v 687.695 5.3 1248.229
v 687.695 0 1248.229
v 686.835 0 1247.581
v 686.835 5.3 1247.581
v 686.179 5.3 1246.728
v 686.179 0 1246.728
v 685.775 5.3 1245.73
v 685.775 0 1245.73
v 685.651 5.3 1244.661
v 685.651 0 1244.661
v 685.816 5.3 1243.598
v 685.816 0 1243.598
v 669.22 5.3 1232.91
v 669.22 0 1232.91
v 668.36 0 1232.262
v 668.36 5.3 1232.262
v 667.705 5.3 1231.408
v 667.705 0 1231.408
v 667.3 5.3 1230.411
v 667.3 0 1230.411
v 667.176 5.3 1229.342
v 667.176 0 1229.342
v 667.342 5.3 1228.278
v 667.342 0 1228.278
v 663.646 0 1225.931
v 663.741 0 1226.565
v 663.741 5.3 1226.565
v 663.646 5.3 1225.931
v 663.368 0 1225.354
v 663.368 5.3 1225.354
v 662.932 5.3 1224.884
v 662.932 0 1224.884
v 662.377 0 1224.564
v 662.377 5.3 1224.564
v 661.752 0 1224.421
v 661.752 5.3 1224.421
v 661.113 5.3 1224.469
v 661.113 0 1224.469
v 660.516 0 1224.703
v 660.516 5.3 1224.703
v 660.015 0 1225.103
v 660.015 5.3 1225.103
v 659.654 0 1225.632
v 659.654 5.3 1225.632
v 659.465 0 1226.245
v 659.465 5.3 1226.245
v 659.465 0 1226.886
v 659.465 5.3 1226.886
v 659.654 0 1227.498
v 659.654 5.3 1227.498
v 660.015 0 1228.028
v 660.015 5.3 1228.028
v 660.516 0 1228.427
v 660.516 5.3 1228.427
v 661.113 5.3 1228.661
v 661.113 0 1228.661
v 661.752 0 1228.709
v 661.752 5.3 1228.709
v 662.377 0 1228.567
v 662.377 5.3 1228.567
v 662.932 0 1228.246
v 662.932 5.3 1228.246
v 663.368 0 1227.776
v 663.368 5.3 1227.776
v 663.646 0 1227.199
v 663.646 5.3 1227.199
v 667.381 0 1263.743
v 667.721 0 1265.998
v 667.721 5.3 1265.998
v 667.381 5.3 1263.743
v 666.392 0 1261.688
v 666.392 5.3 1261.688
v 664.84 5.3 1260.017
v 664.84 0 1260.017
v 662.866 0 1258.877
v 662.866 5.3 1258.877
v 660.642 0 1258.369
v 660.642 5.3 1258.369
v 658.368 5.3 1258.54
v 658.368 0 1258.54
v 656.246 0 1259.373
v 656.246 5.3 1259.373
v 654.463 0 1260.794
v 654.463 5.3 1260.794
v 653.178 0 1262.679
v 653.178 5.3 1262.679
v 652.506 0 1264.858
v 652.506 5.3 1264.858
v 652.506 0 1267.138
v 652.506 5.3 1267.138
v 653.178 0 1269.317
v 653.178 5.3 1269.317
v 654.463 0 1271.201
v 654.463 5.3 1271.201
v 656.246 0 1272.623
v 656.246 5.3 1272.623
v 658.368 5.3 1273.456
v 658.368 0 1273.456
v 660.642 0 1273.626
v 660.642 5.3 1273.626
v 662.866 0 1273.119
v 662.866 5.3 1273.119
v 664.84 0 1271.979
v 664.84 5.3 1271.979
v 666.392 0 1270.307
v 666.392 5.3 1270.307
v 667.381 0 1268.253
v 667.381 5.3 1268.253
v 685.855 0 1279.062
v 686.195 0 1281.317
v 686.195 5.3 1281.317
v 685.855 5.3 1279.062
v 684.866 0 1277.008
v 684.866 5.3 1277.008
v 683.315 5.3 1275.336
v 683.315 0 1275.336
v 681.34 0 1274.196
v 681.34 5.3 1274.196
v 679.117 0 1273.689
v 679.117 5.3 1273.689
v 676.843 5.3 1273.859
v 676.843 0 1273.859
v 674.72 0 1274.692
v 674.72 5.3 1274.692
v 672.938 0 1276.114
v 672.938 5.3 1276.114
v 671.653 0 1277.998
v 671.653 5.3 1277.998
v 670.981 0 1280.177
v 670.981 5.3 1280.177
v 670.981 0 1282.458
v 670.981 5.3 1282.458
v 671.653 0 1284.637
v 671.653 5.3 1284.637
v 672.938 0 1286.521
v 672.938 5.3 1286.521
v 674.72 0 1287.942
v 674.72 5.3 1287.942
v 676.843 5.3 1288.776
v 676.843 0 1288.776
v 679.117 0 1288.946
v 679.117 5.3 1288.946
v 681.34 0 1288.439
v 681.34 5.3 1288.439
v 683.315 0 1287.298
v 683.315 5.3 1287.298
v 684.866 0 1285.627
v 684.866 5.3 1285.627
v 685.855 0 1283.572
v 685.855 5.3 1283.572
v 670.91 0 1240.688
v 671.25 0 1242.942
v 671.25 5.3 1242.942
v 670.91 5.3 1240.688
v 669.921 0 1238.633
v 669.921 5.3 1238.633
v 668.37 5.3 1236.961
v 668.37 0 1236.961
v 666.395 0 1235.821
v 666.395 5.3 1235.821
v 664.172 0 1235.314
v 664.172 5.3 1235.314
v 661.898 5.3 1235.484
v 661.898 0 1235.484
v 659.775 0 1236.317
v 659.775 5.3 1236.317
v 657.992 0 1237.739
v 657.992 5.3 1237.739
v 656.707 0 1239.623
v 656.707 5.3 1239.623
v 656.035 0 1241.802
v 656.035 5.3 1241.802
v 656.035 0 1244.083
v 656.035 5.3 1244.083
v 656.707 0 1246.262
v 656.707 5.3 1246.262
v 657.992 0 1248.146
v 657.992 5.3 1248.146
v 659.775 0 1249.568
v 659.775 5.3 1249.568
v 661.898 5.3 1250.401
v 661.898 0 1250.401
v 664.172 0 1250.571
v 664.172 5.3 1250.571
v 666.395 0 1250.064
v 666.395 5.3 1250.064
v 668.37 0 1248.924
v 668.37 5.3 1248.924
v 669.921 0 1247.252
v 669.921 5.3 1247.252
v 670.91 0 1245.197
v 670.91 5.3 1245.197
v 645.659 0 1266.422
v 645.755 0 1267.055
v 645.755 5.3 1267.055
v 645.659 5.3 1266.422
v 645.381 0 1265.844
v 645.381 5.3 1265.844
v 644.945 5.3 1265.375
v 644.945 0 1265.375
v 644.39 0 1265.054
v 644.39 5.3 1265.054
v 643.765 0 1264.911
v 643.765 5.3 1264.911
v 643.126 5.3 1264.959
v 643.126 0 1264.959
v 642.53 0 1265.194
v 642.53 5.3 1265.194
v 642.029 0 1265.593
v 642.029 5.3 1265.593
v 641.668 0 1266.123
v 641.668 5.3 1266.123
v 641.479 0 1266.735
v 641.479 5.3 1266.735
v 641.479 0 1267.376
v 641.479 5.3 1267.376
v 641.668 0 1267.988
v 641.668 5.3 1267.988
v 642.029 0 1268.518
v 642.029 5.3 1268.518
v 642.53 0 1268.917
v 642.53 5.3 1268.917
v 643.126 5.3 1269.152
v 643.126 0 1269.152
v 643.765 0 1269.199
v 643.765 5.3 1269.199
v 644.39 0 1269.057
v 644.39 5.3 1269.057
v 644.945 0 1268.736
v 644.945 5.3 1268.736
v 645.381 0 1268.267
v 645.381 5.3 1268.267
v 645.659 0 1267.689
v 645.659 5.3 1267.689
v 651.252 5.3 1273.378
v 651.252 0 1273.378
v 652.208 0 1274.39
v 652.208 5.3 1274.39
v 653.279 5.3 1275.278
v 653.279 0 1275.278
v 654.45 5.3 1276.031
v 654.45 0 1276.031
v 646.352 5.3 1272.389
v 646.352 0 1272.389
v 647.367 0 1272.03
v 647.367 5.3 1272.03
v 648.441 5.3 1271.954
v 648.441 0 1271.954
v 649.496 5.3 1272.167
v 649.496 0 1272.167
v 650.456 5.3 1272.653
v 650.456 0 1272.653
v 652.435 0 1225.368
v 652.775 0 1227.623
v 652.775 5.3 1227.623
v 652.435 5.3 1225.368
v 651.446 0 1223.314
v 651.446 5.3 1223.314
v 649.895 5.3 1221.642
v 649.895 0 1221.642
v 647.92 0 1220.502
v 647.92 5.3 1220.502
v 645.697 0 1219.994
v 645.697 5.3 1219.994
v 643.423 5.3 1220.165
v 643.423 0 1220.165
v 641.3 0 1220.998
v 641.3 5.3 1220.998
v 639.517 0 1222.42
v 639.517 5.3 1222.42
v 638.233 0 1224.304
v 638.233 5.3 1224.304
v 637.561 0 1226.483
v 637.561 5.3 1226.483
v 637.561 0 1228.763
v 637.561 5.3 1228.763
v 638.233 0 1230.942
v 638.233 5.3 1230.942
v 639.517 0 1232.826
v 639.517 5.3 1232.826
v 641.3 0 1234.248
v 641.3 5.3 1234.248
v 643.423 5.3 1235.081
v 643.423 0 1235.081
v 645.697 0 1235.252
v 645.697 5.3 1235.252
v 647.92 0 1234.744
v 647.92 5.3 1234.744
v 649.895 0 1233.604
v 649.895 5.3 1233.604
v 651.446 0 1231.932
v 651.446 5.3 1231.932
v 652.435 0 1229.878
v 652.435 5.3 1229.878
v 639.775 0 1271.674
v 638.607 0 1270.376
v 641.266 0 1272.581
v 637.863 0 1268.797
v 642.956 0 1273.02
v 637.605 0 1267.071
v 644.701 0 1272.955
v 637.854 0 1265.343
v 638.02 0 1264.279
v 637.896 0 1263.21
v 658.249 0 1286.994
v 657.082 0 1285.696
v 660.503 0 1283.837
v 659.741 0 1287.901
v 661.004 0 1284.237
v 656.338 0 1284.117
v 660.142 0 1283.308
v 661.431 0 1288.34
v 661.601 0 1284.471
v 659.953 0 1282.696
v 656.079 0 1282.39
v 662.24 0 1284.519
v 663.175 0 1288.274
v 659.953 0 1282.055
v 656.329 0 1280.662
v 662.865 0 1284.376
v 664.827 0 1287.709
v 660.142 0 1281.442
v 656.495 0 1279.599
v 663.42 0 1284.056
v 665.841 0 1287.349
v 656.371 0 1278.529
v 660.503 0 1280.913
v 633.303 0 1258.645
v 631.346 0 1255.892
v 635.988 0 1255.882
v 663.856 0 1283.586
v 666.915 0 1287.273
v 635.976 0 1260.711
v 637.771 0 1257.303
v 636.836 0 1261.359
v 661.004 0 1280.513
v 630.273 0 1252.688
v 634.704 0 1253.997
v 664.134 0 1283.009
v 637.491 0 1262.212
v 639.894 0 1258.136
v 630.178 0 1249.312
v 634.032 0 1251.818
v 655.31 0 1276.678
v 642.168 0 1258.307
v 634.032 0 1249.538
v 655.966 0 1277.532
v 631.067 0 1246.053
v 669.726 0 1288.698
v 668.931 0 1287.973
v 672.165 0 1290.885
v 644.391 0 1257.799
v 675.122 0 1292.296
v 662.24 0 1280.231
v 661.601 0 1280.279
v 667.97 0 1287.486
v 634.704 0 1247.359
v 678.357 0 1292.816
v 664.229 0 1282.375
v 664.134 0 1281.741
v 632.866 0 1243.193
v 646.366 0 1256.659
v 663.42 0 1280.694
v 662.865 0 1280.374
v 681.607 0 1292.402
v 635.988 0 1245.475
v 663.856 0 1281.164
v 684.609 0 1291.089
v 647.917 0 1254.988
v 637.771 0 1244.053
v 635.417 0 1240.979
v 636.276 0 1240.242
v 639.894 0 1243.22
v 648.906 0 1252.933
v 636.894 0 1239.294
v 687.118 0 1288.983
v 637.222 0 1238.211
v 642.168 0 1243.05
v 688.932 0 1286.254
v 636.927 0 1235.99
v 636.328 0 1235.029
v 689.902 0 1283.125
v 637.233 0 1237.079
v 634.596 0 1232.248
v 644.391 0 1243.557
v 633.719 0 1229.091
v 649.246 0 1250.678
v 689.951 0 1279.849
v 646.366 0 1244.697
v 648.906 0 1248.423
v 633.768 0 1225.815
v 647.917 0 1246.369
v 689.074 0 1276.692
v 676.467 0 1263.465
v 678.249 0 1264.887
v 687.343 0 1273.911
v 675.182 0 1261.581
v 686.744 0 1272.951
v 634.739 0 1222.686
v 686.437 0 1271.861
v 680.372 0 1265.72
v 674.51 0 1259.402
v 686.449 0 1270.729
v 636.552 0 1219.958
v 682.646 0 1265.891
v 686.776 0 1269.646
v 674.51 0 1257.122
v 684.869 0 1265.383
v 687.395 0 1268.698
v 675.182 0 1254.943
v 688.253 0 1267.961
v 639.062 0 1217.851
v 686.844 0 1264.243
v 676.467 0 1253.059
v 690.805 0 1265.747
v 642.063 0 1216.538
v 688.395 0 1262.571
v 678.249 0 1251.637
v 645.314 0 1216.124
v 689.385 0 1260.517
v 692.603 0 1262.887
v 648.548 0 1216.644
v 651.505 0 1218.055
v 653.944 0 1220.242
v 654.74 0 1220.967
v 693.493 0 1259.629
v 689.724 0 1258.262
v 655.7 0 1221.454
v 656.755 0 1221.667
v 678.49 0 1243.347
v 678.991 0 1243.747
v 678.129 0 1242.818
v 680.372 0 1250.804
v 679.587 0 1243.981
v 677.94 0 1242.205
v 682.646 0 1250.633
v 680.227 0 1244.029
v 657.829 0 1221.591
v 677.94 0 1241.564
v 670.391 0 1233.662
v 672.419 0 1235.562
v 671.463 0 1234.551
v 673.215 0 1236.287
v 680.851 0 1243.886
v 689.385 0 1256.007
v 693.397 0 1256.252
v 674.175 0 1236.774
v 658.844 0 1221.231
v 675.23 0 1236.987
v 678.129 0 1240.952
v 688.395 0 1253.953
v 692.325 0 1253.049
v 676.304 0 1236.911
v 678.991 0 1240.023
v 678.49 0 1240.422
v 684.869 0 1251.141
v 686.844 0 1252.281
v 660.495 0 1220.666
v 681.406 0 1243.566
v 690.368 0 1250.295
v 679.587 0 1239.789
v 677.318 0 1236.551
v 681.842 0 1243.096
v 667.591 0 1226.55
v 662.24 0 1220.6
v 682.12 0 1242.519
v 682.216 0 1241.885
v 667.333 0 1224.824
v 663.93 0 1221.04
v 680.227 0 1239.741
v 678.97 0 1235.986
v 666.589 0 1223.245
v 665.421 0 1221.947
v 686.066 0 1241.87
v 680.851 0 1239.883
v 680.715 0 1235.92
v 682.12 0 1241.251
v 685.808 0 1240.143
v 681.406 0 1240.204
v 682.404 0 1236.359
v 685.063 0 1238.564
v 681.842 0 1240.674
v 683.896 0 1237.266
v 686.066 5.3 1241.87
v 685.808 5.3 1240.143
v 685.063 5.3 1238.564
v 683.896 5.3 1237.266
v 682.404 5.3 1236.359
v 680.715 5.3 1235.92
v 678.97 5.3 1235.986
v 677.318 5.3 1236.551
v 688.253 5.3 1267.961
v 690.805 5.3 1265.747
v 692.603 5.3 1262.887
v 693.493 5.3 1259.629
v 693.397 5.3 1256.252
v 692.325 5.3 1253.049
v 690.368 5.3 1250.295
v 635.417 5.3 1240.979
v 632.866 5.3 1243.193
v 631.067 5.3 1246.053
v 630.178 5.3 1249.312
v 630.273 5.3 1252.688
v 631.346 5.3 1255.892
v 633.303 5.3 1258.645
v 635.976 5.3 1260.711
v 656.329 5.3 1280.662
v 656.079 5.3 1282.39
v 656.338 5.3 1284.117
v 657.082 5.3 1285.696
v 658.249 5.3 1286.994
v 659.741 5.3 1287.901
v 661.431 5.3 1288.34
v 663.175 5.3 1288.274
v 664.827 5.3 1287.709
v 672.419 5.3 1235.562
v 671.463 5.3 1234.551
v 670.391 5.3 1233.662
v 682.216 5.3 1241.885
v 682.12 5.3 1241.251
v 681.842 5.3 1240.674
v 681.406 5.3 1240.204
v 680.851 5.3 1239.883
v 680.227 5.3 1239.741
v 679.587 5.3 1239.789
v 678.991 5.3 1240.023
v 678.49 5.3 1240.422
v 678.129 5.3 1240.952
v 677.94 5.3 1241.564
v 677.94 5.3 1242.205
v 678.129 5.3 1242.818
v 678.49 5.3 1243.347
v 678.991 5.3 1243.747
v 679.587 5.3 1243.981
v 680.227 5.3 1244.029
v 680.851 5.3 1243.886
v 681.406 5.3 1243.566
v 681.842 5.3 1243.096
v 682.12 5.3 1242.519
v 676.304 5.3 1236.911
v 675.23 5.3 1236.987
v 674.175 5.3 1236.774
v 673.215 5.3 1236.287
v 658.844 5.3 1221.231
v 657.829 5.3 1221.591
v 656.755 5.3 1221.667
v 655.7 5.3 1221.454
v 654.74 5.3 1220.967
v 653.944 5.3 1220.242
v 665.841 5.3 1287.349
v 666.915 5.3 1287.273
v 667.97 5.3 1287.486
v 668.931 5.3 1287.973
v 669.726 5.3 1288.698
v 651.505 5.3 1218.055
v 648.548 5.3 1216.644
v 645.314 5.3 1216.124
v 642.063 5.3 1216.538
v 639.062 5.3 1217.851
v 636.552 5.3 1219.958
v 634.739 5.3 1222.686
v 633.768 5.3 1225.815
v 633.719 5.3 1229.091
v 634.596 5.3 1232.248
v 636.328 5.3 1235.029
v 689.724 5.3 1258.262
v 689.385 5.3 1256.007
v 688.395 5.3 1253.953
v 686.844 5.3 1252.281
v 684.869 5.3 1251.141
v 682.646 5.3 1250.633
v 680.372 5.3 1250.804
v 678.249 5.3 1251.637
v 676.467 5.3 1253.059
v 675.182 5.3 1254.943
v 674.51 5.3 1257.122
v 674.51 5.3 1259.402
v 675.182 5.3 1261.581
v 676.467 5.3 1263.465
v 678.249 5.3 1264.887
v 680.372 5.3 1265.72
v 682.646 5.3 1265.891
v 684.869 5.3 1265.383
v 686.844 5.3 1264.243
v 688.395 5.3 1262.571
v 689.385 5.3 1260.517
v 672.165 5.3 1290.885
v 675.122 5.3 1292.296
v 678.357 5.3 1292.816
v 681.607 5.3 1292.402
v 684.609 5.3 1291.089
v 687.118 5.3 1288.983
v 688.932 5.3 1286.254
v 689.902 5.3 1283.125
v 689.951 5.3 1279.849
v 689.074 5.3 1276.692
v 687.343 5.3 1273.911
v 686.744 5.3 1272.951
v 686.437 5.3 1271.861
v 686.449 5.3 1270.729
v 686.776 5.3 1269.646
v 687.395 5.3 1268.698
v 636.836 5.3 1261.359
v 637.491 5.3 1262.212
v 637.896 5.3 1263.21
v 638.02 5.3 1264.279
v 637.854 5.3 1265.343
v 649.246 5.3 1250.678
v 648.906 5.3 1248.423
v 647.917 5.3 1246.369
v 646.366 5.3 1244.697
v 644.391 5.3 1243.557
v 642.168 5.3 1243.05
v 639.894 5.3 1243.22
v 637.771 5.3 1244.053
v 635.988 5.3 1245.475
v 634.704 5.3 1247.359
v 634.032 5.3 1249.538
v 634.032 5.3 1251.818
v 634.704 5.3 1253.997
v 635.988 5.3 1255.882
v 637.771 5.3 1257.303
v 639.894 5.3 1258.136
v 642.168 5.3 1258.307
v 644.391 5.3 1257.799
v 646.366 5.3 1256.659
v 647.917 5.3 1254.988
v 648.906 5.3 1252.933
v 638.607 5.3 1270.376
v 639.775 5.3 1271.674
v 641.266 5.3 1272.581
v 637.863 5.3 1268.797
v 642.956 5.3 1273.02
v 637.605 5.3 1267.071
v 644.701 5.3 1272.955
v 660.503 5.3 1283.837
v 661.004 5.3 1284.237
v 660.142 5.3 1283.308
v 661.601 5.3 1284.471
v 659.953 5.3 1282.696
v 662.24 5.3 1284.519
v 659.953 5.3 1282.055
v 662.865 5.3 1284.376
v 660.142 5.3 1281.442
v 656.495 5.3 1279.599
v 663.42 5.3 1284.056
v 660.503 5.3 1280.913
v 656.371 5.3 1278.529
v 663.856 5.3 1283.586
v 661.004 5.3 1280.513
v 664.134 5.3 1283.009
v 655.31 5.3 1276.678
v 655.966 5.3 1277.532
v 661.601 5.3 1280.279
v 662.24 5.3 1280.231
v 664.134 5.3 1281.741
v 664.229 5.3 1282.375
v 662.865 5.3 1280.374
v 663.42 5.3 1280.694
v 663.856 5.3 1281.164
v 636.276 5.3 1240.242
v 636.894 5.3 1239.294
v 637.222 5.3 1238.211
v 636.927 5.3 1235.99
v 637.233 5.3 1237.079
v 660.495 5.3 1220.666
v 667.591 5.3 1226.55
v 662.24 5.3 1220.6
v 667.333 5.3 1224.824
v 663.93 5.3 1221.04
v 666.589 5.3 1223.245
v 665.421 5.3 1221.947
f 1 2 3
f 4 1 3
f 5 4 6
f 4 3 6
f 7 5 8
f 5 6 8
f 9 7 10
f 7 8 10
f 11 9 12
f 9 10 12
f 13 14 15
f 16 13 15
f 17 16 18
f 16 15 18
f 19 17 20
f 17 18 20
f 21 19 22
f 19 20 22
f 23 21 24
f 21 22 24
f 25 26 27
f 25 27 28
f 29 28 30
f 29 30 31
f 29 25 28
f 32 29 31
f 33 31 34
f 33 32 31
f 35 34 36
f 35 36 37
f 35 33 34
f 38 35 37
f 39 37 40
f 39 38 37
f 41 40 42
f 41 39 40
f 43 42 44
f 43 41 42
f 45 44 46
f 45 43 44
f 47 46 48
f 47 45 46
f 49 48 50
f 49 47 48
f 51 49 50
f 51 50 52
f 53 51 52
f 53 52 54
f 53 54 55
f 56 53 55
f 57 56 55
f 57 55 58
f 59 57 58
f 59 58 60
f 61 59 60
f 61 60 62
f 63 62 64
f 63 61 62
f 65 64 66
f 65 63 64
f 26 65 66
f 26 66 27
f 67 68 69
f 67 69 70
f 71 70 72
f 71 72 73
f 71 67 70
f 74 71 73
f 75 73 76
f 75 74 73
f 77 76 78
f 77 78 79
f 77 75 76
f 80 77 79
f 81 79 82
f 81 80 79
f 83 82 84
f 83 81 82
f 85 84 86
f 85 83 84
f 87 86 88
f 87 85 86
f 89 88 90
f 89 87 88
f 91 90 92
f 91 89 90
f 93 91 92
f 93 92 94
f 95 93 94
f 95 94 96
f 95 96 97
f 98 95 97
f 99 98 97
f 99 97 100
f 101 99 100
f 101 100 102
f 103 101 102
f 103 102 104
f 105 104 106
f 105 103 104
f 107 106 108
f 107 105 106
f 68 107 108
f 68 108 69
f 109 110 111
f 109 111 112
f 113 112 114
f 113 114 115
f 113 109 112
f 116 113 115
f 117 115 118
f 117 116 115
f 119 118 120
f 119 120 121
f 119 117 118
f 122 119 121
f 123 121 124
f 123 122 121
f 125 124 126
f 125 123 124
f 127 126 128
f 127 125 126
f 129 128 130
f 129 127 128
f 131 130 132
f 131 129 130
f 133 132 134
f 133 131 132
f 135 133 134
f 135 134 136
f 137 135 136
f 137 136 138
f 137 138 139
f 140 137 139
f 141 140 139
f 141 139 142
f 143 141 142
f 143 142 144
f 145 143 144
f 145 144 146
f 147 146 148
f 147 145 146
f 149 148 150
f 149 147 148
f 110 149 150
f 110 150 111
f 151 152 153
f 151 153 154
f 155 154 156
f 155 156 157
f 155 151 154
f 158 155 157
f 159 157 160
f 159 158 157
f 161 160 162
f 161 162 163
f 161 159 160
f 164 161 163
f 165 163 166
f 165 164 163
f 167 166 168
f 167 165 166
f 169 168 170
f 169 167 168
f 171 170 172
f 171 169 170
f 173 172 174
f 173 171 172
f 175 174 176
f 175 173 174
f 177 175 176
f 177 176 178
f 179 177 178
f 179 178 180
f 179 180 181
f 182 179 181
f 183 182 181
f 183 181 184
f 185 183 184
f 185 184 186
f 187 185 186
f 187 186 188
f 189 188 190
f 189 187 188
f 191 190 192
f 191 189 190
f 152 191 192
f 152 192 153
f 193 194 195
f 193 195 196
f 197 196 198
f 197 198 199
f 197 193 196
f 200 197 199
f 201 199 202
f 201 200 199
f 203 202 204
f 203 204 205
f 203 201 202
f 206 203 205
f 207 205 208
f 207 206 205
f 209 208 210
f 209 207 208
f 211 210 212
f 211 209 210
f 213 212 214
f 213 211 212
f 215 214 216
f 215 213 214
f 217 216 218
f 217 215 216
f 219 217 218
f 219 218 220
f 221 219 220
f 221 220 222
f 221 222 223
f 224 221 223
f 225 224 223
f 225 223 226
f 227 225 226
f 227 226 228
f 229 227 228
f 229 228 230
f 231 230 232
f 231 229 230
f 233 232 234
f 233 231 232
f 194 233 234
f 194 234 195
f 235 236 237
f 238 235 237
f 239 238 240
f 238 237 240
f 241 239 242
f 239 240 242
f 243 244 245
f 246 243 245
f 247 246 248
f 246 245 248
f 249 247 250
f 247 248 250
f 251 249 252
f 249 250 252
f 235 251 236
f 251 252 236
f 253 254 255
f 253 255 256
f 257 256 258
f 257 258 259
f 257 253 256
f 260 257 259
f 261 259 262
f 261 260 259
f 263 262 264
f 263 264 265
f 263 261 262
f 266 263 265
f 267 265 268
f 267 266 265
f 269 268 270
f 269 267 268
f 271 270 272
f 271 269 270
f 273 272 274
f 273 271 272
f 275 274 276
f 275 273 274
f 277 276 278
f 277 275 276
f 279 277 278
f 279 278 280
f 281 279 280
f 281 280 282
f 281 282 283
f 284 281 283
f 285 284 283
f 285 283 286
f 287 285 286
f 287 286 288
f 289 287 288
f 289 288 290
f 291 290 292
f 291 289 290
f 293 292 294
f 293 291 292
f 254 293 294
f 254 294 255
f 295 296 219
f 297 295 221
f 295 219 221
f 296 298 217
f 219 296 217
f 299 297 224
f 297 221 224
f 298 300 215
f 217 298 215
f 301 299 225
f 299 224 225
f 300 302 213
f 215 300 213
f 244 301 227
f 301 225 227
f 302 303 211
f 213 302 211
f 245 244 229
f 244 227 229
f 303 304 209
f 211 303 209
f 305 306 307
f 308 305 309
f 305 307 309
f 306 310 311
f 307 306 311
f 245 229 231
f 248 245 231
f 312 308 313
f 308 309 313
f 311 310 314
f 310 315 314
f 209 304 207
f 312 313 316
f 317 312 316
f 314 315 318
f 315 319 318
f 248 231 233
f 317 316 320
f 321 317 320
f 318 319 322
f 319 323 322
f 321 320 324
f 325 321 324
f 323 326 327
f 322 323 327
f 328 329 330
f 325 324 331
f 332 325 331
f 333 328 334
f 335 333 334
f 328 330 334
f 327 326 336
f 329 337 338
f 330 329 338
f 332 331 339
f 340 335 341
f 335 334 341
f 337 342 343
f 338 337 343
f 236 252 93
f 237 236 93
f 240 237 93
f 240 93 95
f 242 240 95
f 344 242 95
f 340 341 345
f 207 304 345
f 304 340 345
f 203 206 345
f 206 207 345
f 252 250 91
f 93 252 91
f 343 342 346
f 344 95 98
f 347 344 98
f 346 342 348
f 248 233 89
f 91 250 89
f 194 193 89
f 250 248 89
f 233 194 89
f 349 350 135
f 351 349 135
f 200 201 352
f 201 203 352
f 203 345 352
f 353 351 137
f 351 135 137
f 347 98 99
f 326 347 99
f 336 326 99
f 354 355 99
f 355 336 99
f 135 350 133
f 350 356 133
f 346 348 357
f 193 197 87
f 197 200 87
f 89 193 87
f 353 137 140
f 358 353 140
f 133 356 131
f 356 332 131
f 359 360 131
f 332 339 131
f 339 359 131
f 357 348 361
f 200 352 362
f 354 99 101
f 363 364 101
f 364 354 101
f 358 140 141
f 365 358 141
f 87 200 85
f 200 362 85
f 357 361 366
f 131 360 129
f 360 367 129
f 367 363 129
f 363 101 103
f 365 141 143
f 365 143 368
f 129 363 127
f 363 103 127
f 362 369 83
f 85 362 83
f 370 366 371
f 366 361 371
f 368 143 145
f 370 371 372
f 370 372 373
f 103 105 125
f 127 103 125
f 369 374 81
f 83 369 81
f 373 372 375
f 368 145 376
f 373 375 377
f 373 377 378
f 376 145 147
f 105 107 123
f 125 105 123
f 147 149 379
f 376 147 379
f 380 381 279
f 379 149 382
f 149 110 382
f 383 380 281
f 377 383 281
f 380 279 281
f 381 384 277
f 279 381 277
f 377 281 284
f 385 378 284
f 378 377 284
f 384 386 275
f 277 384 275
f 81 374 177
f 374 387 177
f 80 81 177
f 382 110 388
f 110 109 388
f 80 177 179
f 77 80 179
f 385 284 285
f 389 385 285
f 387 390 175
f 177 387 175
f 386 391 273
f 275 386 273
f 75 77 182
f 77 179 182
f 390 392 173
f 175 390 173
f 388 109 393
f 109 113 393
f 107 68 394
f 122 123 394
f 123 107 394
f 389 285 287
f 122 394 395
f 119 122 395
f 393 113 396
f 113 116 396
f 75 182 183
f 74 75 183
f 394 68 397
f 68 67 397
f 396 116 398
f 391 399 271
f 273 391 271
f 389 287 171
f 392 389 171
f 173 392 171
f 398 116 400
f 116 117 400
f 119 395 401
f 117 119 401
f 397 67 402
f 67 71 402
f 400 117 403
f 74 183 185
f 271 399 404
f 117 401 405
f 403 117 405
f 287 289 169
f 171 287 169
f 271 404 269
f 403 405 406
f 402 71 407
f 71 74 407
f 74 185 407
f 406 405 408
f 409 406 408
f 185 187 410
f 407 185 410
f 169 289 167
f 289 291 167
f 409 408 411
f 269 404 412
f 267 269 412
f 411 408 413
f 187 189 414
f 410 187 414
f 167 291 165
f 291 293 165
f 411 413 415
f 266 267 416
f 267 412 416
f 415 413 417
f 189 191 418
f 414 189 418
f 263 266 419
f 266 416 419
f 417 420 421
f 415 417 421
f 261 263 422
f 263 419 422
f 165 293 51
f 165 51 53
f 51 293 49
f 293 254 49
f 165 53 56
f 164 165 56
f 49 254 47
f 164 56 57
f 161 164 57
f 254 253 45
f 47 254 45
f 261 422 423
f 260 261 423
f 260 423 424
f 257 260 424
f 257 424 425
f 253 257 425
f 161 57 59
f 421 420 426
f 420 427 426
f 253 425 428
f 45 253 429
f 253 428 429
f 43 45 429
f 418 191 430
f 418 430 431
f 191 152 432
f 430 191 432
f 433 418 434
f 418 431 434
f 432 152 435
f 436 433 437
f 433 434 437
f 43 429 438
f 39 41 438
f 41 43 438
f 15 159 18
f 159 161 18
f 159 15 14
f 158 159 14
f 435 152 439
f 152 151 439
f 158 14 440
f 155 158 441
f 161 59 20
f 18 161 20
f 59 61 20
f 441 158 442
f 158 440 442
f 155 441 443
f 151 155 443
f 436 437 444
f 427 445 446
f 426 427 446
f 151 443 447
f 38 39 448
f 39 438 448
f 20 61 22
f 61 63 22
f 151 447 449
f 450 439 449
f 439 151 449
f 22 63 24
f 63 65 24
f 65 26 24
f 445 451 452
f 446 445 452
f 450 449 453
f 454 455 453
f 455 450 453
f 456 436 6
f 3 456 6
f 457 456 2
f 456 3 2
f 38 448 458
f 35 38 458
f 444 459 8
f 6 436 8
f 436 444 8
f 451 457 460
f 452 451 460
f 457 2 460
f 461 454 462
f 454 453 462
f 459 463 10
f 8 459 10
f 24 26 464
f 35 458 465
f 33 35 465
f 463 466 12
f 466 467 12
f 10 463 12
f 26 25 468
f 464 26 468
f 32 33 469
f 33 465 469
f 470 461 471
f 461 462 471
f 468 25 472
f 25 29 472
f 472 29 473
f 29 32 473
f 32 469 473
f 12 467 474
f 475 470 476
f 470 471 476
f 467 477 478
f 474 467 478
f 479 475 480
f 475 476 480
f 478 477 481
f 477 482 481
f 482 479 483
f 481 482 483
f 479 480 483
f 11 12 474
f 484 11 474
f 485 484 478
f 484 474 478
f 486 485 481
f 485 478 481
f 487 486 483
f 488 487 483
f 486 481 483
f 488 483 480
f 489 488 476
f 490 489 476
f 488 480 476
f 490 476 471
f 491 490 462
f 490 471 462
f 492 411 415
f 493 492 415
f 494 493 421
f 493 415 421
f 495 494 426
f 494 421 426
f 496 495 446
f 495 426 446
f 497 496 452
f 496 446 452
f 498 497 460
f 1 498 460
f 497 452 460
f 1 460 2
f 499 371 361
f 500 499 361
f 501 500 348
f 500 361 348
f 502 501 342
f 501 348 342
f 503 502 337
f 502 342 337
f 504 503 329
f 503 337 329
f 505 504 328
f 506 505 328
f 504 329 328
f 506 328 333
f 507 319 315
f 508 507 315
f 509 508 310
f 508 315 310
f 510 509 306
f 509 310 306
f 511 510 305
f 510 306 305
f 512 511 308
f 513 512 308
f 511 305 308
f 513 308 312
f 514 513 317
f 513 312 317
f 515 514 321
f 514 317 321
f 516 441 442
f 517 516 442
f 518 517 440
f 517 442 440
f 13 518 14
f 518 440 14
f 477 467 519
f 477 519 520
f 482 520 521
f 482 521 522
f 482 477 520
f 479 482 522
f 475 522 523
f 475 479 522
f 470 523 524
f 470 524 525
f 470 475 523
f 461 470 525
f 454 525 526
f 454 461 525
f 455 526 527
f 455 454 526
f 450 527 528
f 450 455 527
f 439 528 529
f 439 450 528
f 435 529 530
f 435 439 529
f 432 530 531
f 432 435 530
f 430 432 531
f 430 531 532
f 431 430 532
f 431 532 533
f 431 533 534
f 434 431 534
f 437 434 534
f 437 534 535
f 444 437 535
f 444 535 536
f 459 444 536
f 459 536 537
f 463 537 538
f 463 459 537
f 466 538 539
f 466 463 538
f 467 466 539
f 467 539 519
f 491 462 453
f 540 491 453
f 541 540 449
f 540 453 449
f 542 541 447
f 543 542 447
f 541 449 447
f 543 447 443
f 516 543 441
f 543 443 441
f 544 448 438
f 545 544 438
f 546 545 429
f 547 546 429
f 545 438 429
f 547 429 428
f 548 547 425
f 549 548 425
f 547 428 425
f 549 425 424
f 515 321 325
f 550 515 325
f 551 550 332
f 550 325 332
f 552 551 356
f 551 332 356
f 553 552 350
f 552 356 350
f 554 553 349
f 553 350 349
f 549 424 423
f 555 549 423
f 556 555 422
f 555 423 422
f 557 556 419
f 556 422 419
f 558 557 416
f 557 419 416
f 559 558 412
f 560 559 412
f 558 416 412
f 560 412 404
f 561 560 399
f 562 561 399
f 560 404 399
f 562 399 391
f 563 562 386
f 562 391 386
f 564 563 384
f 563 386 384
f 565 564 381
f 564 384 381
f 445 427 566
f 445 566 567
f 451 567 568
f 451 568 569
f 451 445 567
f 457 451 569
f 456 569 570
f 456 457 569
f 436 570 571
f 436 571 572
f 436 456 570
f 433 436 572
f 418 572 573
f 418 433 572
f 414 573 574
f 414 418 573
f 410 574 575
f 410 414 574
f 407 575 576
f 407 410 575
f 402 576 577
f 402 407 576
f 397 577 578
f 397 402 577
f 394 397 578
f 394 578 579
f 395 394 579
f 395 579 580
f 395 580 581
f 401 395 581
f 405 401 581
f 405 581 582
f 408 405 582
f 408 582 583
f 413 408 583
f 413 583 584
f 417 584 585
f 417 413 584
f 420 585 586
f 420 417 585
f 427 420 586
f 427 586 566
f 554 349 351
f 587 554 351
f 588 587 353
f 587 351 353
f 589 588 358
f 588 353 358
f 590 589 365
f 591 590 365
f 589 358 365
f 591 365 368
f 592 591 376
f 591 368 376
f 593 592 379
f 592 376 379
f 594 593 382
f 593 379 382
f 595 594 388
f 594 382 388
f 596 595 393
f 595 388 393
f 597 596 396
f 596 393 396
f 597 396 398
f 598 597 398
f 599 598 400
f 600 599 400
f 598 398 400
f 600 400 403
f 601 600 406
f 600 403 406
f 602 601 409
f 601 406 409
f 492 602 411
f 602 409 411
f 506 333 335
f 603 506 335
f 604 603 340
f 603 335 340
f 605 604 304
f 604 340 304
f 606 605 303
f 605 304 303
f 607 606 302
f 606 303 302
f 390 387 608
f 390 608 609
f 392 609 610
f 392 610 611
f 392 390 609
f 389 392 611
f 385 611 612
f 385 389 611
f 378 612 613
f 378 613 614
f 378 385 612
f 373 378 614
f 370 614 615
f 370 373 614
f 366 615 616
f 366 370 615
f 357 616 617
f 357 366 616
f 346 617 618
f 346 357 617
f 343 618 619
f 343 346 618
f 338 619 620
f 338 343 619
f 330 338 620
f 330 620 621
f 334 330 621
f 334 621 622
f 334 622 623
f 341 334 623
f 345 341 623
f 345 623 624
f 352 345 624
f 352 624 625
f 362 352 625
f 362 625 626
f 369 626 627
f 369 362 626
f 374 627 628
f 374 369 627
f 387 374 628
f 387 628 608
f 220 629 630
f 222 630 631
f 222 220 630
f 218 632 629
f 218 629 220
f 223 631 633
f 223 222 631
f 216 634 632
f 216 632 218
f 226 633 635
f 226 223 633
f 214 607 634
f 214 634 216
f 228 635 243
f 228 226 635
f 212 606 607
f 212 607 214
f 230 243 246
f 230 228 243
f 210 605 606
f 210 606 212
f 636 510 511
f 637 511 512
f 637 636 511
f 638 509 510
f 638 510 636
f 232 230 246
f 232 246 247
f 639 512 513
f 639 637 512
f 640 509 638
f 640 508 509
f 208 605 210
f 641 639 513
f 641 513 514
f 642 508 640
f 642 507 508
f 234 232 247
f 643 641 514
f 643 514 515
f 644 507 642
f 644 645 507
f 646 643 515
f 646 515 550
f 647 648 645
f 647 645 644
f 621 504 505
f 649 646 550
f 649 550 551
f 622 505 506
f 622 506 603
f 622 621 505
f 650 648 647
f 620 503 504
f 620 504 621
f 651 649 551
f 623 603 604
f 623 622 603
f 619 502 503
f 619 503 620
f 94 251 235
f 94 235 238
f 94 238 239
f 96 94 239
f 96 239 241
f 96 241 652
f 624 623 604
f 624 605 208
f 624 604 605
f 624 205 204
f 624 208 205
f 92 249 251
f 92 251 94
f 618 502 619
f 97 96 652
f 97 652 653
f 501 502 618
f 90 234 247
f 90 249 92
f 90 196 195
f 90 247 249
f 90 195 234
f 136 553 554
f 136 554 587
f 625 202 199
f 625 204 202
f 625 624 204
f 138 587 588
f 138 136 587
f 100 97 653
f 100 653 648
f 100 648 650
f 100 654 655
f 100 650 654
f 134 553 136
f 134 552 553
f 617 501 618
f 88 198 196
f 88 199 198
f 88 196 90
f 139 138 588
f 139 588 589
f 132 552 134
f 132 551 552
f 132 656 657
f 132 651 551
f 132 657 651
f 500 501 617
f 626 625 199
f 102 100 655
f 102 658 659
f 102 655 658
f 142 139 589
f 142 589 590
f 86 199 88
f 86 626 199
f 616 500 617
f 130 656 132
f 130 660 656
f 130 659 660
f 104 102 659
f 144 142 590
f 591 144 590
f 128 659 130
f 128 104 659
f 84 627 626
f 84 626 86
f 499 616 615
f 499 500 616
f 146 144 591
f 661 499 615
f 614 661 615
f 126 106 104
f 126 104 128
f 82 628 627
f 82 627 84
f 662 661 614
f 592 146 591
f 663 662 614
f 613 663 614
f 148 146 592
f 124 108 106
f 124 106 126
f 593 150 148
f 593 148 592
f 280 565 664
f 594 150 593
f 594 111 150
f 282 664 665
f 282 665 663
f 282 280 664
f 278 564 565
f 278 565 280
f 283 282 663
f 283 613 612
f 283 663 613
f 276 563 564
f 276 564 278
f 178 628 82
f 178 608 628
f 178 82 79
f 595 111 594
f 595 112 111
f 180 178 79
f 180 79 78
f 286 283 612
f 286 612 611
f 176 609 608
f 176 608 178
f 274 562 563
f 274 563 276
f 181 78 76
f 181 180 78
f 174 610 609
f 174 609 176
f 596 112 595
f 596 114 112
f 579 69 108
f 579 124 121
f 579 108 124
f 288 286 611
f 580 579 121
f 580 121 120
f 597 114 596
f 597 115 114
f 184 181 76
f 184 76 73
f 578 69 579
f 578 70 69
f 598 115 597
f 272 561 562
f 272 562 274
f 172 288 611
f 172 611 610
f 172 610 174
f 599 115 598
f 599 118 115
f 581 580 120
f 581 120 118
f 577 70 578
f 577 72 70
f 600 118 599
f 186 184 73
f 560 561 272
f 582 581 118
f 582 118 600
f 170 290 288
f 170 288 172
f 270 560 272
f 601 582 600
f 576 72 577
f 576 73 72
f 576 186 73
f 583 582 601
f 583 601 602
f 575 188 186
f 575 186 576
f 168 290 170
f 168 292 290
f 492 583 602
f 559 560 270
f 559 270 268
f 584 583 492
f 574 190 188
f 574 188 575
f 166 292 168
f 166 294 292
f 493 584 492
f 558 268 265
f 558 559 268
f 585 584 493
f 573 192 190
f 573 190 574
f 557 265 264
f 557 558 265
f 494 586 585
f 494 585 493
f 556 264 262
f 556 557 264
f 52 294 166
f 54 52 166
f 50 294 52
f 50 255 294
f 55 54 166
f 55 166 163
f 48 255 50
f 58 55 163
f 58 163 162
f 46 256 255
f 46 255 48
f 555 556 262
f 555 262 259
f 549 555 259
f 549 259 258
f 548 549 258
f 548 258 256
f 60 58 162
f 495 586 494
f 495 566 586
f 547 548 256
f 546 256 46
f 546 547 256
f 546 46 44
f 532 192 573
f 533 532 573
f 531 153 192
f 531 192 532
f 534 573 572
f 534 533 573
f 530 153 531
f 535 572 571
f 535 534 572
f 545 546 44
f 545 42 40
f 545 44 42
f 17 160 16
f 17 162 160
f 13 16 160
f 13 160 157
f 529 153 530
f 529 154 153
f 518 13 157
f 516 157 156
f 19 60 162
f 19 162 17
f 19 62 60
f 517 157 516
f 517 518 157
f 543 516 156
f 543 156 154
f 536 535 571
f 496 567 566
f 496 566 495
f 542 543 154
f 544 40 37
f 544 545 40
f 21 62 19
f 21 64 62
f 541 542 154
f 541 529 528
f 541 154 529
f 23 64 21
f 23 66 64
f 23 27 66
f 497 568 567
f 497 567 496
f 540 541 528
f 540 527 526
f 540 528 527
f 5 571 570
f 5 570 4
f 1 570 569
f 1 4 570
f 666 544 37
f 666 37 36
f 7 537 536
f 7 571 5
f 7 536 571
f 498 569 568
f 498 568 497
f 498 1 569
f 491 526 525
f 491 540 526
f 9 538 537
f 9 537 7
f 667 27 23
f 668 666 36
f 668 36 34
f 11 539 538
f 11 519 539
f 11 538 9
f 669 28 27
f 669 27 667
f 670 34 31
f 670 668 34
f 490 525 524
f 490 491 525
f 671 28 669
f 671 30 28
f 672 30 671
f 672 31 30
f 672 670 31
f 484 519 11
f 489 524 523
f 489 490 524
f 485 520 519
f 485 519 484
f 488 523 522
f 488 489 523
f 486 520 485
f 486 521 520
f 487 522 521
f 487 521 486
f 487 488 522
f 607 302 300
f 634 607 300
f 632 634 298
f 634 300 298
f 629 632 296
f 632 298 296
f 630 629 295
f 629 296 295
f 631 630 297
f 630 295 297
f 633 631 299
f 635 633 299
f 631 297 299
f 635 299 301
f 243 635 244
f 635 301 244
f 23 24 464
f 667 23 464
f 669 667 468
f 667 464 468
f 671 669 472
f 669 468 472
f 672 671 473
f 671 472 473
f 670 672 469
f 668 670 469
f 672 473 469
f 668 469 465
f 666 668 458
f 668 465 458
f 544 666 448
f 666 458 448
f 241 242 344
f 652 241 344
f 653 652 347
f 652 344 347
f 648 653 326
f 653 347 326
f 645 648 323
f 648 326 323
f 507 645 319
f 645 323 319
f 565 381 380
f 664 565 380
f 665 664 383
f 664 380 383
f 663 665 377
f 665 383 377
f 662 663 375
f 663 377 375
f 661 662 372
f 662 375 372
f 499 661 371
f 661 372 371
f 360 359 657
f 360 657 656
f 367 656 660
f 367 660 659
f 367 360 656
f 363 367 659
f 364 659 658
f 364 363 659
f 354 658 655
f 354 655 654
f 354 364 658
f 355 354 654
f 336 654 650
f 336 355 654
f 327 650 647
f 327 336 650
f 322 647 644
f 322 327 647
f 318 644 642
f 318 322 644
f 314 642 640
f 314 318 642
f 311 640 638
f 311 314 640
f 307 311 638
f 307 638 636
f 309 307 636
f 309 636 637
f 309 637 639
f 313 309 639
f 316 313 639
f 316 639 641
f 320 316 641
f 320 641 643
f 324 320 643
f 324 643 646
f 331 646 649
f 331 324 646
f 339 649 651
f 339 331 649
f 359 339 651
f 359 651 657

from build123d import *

# Parameters (mm, degrees)
SKETCH3_R           = 7.65
SKETCH3_R_2         = 2.15
BOSS_EXTRUDE1_DEPTH = 5.3


with BuildPart() as part:
    # Sketch3 → Boss-Extrude1 (new body)
    with BuildSketch(Plane(origin=(0, 0, 0), x_dir=(1, 0, 0), z_dir=(0, 1, 0))):
        with BuildLine():
            ThreePointArc((653.944459341, -1220.242432272), (637.731714088, -1218.814624577), (636.327920195, -1235.029466732))
            ThreePointArc((636.327920195, -1235.029466732), (637.221930793, -1238.210887622), (635.417200611, -1240.979216142))
            ThreePointArc((635.417200611, -1240.979216142), (630.100805603, -1251.003580625), (635.975748621, -1260.711154148))
            ThreePointArc((635.975748621, -1260.711154148), (637.727498088, -1262.697402891), (637.854371527, -1265.34272204))
            ThreePointArc((637.854371527, -1265.34272204), (639.774817514, -1271.674124807), (646.352289419, -1272.389412948))
            ThreePointArc((646.352289419, -1272.389412948), (648.975379282, -1272.024433719), (651.251559888, -1273.378247634))
            ThreePointArc((651.251559888, -1273.378247634), (652.730141334, -1274.850178419), (654.450327382, -1276.030747471))
            ThreePointArc((654.450327382, -1276.030747471), (656.202076849, -1278.016996214), (656.328950289, -1280.662315363))
            ThreePointArc((656.328950289, -1280.662315363), (658.249396276, -1286.99371813), (664.826868181, -1287.709006271))
            ThreePointArc((664.826868181, -1287.709006271), (667.449958044, -1287.344027042), (669.726138649, -1288.697840957))
            ThreePointArc((669.726138649, -1288.697840957), (685.938883902, -1290.125648653), (687.342677795, -1273.910806497))
            ThreePointArc((687.342677795, -1273.910806497), (686.448667197, -1270.729385607), (688.253397379, -1267.961057087))
            ThreePointArc((688.253397379, -1267.961057087), (693.569792387, -1257.936692604), (687.694849369, -1248.229119081))
            ThreePointArc((687.694849369, -1248.229119081), (685.943099902, -1246.242870338), (685.816226463, -1243.59755119))
            ThreePointArc((685.816226463, -1243.59755119), (683.895780476, -1237.266148422), (677.318308571, -1236.550860281))
            ThreePointArc((677.318308571, -1236.550860281), (674.695218708, -1236.91583951), (672.419038102, -1235.562025595))
            ThreePointArc((672.419038102, -1235.562025595), (670.940456656, -1234.09009481), (669.220270608, -1232.909525758))
            ThreePointArc((669.220270608, -1232.909525758), (667.468521141, -1230.923277015), (667.341647701, -1228.277957867))
            ThreePointArc((667.341647701, -1228.277957867), (665.421201714, -1221.946555099), (658.843729809, -1221.231266958))
            ThreePointArc((658.843729809, -1221.231266958), (656.220639946, -1221.596246187), (653.944459341, -1220.242432272))
        make_face()
        with Locations((645.125239428, -1227.62290381)):
            Circle(SKETCH3_R, mode=Mode.SUBTRACT)
        with Locations((663.599818189, -1242.942497133)):
            Circle(SKETCH3_R, mode=Mode.SUBTRACT)
        with Locations((682.074396951, -1258.262090456)):
            Circle(SKETCH3_R, mode=Mode.SUBTRACT)
        with Locations((678.545358562, -1281.317369419)):
            Circle(SKETCH3_R, mode=Mode.SUBTRACT)
        with Locations((660.070779801, -1265.997776096)):
            Circle(SKETCH3_R, mode=Mode.SUBTRACT)
        with Locations((641.596201039, -1250.678182773)):
            Circle(SKETCH3_R, mode=Mode.SUBTRACT)
        with Locations((643.604715845, -1267.055480116)):
            Circle(SKETCH3_R_2, mode=Mode.SUBTRACT)
        with Locations((662.079294606, -1282.375073439)):
            Circle(SKETCH3_R_2, mode=Mode.SUBTRACT)
        with Locations((680.065882145, -1241.884793113)):
            Circle(SKETCH3_R_2, mode=Mode.SUBTRACT)
        with Locations((661.591303384, -1226.56519979)):
            Circle(SKETCH3_R_2, mode=Mode.SUBTRACT)
    extrude(amount=BOSS_EXTRUDE1_DEPTH)


solid = part.part
